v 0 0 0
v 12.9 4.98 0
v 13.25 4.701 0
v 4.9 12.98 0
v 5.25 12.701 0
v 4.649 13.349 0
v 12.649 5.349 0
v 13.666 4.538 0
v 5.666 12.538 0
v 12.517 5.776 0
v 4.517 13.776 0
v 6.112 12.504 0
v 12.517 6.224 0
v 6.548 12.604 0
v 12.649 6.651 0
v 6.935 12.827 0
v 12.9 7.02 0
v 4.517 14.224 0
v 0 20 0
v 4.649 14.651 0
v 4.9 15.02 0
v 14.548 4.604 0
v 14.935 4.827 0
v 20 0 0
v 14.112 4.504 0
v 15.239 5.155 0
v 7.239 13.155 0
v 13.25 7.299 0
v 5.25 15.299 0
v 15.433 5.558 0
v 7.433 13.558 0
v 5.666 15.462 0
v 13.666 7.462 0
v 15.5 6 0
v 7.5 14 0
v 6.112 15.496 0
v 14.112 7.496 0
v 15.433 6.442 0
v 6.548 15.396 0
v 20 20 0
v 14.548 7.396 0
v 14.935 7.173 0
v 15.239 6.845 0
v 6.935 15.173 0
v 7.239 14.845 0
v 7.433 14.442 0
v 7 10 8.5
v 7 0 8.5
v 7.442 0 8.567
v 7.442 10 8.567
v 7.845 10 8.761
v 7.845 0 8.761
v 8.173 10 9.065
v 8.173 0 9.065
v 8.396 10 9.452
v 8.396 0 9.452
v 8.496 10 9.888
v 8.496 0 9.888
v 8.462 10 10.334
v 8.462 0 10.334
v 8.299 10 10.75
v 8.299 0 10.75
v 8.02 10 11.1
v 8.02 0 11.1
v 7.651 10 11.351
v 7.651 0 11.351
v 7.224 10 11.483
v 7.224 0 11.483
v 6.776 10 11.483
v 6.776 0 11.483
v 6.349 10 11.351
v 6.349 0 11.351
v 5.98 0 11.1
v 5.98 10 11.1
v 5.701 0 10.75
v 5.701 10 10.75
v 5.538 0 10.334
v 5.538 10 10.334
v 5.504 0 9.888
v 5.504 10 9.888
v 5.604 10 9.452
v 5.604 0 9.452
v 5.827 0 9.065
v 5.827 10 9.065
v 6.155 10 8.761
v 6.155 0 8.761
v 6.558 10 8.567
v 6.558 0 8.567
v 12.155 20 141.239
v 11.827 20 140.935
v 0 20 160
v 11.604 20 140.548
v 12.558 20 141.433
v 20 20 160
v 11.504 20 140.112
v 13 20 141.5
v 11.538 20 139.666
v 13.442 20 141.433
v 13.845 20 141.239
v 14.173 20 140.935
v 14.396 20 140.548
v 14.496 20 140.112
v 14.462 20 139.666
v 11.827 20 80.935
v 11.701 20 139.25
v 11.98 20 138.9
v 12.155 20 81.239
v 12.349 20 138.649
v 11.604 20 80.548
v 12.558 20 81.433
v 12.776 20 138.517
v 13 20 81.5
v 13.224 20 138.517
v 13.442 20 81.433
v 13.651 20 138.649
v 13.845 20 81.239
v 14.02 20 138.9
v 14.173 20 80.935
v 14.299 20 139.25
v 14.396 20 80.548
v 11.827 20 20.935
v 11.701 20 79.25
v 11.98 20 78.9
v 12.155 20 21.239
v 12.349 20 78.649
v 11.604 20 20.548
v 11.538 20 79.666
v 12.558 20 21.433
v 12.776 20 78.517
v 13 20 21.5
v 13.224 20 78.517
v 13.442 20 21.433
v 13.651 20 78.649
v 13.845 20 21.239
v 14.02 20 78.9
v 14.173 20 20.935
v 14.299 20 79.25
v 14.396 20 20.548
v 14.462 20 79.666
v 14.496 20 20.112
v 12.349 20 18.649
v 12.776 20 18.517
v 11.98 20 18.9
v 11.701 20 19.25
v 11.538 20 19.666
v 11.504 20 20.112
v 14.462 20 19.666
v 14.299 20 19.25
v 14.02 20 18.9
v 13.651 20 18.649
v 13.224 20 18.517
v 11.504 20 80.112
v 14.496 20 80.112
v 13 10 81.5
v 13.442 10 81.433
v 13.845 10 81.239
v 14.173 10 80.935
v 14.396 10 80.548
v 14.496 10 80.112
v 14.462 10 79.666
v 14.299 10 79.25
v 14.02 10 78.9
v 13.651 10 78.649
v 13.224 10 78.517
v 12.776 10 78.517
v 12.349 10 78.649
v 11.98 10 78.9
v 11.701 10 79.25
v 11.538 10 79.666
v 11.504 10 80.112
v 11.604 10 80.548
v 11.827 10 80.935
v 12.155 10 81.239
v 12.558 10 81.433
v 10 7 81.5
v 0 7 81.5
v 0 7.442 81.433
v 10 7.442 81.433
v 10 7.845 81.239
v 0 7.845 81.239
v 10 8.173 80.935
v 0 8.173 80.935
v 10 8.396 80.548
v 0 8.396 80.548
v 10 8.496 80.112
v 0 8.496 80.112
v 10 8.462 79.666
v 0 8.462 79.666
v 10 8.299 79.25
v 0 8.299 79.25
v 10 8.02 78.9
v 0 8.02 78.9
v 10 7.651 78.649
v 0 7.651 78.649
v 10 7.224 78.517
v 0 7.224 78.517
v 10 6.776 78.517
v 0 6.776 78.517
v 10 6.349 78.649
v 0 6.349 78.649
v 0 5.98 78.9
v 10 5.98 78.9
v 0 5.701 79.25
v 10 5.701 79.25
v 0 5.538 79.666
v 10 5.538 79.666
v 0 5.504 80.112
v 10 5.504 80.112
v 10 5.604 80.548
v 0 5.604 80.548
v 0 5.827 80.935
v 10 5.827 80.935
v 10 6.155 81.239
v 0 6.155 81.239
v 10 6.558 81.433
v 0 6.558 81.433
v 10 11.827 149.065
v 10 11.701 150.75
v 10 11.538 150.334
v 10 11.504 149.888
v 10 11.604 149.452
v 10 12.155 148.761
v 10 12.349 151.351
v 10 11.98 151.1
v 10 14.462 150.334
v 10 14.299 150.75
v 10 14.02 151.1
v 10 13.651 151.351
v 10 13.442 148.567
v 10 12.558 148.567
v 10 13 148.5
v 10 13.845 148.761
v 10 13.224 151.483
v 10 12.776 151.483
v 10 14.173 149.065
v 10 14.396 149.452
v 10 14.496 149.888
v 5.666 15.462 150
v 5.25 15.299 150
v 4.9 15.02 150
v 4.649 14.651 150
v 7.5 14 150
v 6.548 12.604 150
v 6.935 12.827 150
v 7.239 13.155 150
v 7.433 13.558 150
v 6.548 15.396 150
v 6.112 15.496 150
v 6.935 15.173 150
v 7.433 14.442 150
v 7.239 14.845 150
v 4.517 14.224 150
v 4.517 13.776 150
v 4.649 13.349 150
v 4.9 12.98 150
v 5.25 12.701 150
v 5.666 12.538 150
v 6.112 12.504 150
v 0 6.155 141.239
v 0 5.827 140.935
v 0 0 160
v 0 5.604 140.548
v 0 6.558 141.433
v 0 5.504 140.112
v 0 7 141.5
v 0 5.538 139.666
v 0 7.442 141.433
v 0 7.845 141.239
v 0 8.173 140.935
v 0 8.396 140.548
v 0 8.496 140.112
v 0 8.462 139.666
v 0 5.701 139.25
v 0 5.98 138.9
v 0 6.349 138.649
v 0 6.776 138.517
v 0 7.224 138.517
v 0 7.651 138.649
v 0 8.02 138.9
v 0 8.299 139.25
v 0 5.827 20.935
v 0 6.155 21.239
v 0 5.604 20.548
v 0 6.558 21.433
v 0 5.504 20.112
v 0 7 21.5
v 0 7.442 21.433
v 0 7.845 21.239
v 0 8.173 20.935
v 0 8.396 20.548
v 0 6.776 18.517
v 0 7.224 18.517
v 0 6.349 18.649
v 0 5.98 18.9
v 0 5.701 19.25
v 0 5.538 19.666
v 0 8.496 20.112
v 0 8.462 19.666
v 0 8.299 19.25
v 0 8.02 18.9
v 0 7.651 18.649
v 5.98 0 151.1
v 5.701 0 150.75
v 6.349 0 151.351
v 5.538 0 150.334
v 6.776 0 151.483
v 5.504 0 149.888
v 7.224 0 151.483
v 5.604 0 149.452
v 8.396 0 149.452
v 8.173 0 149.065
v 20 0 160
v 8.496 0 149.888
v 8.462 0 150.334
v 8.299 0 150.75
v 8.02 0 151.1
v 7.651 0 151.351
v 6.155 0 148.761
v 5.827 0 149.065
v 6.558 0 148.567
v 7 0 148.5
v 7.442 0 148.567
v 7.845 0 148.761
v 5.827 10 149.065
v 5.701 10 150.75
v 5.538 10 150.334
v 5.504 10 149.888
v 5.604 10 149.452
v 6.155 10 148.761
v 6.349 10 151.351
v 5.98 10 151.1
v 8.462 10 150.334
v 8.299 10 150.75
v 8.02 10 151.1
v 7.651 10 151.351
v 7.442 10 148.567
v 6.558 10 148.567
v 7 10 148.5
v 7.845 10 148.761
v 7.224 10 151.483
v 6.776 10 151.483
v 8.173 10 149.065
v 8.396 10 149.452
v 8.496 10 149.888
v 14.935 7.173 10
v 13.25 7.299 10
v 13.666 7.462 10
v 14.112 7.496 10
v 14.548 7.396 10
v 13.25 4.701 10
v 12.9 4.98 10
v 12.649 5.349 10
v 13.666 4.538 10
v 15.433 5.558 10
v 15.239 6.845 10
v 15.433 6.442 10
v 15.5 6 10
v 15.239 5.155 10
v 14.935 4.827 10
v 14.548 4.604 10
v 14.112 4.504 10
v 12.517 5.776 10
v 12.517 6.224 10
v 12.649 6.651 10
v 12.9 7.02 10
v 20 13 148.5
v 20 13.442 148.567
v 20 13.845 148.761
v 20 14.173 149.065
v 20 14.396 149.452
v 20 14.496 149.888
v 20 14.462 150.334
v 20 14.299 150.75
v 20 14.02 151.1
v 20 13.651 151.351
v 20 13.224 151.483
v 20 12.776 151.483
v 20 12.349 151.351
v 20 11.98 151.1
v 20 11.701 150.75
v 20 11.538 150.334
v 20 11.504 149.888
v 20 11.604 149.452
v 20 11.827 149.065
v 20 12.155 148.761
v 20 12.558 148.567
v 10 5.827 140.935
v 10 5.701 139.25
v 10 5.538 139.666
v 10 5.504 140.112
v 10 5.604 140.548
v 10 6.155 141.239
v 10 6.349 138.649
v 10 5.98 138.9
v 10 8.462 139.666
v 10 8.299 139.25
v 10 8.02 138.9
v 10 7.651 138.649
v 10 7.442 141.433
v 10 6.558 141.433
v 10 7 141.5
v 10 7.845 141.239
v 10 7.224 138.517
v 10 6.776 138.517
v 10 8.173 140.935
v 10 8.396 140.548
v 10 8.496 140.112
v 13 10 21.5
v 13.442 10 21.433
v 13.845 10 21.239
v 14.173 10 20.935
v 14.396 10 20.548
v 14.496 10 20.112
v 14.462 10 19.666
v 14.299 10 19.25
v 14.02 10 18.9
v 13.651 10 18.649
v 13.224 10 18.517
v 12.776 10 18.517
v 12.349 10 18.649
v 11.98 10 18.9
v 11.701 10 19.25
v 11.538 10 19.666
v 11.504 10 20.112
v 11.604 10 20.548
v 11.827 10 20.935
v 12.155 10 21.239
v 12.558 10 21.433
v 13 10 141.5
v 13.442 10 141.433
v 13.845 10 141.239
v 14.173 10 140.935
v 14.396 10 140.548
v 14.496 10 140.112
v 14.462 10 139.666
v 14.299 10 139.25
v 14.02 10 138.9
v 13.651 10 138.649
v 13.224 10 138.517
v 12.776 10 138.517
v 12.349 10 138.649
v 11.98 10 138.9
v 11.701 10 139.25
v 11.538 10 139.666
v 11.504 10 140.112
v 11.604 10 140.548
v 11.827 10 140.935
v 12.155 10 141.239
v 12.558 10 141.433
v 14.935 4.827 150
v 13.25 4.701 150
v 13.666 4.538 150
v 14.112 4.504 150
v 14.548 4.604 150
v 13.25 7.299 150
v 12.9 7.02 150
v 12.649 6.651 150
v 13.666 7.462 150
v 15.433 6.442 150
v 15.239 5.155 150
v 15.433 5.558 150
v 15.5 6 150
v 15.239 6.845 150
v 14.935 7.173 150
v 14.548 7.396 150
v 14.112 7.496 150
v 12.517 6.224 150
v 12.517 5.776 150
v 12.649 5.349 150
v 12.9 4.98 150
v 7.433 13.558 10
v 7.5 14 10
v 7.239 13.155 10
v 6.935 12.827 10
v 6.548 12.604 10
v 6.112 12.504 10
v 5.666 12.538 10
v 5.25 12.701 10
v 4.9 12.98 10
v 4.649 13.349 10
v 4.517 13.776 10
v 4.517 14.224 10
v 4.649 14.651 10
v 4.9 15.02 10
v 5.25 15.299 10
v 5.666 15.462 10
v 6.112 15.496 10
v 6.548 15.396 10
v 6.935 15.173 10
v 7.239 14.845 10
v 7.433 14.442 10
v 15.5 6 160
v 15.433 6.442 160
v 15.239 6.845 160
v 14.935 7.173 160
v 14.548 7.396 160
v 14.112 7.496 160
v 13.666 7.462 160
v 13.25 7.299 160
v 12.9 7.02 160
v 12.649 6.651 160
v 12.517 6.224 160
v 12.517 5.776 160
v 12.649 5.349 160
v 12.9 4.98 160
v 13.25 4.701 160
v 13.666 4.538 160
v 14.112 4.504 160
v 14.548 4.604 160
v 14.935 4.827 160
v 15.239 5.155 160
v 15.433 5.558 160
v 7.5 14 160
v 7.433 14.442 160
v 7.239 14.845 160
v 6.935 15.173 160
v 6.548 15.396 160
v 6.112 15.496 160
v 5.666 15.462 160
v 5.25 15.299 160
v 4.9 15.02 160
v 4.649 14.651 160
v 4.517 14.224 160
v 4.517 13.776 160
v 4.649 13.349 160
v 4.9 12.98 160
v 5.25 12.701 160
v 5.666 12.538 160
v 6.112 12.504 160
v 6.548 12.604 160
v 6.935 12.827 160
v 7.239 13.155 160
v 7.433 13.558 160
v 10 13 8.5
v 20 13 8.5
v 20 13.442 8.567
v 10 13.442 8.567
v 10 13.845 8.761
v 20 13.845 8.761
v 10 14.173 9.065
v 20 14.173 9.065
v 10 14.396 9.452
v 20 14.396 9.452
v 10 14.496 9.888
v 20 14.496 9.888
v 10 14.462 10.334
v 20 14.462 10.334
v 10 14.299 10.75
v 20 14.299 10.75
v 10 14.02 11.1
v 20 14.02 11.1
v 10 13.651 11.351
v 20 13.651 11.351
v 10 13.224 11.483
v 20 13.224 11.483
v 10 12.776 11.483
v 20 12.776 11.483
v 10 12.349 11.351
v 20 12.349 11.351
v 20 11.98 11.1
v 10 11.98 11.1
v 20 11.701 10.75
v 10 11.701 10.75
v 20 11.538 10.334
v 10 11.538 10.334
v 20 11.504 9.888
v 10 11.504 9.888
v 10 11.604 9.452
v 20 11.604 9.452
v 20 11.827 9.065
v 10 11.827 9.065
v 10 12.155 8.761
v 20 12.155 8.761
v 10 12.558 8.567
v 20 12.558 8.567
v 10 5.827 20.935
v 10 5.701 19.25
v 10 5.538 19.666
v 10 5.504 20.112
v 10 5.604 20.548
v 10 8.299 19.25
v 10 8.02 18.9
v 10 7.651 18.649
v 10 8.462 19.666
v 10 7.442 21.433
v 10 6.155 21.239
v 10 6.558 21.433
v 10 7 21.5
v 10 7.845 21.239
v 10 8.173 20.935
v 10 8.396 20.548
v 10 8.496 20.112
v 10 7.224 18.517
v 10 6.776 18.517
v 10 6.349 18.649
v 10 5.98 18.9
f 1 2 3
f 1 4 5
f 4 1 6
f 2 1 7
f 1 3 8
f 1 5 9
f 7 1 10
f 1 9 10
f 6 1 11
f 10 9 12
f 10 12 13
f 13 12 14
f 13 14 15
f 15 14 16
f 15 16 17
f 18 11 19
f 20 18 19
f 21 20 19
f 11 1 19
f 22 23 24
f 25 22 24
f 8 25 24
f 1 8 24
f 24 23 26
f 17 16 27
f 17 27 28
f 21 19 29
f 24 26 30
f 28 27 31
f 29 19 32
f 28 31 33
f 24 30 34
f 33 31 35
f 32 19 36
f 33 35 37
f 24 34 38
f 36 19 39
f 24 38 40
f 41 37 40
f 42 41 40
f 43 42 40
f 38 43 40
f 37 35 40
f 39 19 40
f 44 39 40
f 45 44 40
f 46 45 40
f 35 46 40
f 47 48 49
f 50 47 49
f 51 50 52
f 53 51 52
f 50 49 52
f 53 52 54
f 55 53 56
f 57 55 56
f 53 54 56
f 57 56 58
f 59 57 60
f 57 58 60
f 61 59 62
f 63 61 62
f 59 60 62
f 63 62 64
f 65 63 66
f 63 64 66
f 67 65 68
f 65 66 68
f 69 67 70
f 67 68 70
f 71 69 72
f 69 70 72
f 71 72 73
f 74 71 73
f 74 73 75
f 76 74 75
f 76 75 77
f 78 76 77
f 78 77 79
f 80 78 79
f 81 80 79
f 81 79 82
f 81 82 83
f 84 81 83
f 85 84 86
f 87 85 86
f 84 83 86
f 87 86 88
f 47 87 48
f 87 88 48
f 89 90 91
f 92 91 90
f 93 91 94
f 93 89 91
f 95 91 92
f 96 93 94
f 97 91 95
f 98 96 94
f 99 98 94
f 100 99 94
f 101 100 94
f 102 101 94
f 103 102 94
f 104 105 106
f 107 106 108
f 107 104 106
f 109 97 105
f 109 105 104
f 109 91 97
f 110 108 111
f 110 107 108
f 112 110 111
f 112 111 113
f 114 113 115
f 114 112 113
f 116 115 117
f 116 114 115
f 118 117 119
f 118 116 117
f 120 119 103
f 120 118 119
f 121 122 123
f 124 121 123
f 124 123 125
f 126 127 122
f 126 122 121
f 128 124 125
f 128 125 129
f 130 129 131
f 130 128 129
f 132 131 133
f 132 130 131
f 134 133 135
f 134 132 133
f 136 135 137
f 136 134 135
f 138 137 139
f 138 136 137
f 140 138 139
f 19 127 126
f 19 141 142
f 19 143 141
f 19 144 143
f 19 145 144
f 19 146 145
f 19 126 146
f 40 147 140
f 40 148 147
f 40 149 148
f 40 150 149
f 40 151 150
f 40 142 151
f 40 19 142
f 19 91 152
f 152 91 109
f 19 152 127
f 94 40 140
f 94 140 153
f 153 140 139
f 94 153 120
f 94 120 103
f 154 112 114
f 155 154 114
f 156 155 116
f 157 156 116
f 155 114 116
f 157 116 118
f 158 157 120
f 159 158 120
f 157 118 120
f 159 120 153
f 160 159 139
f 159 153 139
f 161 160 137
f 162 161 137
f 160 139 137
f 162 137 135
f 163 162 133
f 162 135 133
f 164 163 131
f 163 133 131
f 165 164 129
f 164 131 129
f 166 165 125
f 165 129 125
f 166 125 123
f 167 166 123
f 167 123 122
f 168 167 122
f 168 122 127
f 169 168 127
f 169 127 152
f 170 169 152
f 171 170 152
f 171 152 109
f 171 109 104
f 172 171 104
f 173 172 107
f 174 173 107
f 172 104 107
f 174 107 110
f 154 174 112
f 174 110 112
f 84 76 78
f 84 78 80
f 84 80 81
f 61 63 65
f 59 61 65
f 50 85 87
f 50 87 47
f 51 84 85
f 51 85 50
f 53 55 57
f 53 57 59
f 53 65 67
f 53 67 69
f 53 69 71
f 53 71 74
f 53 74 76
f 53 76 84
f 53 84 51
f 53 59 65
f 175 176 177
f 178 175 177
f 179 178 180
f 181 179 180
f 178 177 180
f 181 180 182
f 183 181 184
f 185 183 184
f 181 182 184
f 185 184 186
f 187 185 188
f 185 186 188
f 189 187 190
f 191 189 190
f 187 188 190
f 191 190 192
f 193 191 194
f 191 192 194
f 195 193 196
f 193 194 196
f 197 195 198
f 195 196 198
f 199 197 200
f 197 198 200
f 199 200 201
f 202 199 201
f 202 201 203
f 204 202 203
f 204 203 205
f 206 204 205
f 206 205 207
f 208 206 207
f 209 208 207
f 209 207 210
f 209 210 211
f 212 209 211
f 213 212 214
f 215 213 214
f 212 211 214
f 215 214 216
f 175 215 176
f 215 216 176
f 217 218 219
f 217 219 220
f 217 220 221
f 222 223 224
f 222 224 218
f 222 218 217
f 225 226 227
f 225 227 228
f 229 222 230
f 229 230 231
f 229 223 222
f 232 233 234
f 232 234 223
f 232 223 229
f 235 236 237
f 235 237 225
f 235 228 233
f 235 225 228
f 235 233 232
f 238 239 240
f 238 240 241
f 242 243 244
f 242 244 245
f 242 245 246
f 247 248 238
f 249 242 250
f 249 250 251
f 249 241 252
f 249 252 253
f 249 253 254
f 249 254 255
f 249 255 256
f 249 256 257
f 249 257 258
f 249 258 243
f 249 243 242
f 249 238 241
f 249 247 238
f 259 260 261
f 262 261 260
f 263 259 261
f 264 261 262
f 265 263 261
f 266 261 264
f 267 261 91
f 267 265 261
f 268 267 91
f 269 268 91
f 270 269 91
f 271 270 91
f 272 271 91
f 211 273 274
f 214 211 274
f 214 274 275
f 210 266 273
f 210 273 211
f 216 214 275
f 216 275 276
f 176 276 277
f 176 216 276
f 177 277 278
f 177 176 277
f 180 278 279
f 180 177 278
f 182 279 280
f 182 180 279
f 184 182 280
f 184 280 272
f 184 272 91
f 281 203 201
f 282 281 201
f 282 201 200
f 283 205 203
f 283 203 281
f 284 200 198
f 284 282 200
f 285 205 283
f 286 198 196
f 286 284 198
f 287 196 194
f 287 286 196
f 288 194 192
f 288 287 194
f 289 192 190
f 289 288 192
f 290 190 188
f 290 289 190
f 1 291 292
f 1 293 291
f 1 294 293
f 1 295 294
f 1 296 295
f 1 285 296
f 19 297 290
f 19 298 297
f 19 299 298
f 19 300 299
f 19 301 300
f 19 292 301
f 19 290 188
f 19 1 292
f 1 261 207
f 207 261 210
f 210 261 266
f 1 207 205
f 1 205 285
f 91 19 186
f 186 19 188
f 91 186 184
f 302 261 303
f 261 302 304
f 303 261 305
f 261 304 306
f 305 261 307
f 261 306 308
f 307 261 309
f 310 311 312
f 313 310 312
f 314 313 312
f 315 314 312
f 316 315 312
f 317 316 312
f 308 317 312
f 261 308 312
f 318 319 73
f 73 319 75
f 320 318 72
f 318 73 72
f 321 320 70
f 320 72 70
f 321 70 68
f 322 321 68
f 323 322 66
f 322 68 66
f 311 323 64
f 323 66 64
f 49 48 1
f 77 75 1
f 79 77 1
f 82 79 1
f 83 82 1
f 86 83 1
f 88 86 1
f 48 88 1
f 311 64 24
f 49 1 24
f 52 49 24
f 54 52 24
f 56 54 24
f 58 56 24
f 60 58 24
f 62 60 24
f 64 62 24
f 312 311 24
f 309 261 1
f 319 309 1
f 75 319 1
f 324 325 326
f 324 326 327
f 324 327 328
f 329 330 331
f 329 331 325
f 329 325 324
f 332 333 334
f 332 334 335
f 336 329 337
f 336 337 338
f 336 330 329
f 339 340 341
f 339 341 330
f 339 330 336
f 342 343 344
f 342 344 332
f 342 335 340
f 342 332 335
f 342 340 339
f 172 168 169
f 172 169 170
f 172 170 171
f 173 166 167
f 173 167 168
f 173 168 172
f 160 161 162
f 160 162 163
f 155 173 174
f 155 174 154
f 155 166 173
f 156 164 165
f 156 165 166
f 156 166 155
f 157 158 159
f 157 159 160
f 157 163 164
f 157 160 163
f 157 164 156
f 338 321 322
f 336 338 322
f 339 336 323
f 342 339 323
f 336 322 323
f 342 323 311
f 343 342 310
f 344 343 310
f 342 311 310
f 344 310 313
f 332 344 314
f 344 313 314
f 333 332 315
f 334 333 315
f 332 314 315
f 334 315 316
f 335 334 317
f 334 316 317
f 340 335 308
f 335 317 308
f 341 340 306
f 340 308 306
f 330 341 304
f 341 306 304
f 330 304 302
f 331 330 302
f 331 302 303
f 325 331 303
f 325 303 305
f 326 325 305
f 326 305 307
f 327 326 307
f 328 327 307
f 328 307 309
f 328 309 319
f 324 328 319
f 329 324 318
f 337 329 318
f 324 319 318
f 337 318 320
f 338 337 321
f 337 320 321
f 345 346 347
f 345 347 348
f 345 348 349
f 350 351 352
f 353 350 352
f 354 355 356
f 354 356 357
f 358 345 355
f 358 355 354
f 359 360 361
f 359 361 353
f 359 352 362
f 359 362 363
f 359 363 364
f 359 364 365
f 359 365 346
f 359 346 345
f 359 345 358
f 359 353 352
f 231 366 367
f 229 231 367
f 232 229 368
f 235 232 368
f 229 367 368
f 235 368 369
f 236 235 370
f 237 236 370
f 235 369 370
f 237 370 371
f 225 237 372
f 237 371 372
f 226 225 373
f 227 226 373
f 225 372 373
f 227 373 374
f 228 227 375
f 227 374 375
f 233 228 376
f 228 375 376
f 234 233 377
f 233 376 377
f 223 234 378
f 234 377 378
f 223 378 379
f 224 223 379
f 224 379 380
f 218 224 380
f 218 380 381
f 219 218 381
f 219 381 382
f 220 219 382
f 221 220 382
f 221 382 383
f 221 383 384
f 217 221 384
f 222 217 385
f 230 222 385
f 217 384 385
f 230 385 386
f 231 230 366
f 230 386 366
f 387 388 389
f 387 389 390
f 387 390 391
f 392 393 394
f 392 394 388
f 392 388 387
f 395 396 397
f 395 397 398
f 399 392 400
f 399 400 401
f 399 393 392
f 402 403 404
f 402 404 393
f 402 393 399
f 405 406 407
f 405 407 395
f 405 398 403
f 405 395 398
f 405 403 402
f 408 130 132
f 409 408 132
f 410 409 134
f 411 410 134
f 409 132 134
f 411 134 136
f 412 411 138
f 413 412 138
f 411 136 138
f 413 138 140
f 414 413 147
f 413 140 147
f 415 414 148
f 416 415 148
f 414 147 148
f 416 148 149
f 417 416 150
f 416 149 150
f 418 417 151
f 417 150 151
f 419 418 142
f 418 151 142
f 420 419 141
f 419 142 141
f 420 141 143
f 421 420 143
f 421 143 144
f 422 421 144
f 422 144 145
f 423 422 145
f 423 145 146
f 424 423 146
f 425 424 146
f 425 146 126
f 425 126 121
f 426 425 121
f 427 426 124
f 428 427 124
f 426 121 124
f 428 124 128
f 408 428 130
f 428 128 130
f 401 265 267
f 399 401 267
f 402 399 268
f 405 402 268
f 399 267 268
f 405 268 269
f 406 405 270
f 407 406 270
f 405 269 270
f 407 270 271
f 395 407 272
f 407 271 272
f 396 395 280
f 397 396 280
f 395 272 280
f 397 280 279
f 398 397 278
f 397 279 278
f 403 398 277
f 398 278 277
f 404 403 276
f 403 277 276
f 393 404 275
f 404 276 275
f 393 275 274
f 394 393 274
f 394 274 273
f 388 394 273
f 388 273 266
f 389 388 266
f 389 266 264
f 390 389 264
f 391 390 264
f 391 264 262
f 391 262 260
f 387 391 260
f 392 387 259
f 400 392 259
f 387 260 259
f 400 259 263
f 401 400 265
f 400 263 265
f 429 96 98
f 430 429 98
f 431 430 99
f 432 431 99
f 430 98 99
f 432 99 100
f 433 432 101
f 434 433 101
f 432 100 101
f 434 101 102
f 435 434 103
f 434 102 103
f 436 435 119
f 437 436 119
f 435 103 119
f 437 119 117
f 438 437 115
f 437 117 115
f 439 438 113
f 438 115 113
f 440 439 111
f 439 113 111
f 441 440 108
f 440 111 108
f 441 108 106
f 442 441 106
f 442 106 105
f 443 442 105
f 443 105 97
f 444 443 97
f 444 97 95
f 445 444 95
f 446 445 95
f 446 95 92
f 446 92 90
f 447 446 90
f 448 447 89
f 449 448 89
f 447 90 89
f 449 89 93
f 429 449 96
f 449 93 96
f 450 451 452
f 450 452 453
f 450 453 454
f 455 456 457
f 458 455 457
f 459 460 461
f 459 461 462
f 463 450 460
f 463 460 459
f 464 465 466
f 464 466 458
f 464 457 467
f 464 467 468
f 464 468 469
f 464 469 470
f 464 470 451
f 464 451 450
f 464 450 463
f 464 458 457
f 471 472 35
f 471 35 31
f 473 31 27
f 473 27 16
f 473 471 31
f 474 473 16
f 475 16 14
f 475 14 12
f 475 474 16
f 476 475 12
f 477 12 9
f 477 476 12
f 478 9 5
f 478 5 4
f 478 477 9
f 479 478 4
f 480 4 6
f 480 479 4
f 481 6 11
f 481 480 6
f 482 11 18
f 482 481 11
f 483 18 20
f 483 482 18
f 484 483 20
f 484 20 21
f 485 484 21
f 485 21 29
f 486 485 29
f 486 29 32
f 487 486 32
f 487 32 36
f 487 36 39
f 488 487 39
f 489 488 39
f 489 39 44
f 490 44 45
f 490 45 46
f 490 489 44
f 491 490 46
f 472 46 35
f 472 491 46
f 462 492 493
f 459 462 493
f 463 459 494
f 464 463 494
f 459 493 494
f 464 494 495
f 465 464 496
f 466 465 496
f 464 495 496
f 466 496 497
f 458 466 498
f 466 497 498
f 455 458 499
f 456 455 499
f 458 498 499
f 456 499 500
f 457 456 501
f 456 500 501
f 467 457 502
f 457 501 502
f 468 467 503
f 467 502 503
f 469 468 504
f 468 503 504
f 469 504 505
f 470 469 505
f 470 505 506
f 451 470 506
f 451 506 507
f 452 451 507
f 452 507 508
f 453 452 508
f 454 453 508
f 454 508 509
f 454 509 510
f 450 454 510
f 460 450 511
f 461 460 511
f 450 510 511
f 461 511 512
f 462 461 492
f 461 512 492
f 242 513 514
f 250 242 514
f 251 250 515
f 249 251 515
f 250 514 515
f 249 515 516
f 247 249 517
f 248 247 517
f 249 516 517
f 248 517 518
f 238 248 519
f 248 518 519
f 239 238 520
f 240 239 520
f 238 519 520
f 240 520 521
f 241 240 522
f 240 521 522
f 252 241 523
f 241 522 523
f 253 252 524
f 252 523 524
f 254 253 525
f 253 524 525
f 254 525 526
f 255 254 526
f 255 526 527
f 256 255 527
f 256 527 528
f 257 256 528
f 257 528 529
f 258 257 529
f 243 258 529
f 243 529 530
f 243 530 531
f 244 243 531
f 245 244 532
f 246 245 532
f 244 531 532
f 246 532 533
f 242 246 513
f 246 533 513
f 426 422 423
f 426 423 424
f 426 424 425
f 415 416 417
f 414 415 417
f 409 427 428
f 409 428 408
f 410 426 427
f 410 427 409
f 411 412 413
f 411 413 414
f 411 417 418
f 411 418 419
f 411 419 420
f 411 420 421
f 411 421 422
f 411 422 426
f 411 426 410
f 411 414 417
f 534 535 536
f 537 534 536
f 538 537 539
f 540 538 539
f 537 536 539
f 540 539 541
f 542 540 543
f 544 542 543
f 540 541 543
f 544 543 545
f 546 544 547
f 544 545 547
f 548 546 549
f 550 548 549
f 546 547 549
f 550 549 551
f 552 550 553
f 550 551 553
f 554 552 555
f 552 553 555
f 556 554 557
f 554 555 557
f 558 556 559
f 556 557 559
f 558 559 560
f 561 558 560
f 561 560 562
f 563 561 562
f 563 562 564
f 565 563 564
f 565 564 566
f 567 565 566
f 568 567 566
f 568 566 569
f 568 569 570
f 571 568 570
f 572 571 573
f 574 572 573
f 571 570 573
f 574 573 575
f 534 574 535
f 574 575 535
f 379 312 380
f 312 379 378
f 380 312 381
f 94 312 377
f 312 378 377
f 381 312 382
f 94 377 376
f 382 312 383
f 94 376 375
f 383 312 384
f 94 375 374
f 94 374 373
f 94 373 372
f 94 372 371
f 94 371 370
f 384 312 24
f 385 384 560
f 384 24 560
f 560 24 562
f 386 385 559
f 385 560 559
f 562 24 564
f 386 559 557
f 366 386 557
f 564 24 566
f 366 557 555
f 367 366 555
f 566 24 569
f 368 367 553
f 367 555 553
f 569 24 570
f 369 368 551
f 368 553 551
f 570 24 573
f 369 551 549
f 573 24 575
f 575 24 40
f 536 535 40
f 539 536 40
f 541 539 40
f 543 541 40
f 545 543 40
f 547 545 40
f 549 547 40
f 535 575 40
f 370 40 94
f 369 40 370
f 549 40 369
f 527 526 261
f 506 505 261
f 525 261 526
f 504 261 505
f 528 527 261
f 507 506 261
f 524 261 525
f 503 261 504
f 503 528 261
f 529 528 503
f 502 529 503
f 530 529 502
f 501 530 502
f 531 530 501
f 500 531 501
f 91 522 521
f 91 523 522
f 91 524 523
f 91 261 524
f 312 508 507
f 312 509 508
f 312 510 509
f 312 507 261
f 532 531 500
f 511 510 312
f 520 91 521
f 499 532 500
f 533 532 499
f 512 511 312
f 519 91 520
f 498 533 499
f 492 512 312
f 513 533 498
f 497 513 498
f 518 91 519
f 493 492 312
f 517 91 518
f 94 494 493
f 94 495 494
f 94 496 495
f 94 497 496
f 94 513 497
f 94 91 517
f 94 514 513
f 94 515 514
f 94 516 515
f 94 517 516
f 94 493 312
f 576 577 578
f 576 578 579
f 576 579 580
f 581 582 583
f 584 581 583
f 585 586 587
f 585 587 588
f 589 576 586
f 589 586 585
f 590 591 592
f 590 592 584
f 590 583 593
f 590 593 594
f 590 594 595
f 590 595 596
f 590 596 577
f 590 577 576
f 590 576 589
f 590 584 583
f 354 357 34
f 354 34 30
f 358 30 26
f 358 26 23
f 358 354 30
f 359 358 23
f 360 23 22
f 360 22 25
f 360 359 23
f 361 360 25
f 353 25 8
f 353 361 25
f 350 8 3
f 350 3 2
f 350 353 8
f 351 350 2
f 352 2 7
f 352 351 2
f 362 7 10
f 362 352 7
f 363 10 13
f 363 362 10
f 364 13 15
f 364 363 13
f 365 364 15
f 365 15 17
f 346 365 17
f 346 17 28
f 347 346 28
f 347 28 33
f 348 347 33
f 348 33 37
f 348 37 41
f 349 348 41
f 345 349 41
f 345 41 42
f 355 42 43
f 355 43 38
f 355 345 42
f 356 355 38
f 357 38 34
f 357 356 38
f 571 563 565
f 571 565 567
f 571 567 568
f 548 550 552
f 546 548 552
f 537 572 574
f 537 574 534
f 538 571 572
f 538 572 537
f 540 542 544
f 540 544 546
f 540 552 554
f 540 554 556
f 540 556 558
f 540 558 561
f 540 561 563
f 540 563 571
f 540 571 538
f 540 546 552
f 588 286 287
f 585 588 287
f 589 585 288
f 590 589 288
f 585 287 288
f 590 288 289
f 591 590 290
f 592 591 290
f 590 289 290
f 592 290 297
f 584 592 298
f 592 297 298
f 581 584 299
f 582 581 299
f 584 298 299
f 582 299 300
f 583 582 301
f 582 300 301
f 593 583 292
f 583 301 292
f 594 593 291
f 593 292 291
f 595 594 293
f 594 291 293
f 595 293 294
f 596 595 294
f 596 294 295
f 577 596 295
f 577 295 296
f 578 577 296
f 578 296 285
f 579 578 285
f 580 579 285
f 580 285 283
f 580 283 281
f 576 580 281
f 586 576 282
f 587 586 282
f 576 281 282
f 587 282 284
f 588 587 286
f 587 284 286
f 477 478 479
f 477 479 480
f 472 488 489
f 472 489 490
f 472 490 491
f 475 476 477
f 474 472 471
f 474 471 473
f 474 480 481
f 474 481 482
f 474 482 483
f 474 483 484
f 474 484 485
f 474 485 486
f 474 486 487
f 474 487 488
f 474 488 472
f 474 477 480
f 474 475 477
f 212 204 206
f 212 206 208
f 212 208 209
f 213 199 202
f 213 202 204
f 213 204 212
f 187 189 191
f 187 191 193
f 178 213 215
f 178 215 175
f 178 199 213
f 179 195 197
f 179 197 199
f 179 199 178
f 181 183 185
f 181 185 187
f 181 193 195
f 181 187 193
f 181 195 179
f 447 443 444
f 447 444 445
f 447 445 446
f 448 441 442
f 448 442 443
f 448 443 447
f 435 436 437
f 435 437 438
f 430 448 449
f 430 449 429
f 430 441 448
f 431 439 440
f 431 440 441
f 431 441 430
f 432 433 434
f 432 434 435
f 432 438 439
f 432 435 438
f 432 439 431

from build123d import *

# Parameters (mm, degrees)
IZIM1_W                     = 20
IZIM1_H                     = 20
Y_KSEKLIK_EKSTR_ZYON1_DEPTH = 160
IZIM13_R                    = 1.5
KES_EKSTR_ZYON1_DEPTH       = 10
KES_EKSTR_ZYON2_START       = -10
IZIM15_R                    = 1.5
KES_EKSTR_ZYON2_DEPTH       = 10
IZIM18_R                    = 1.5
KES_EKSTR_ZYON3_DEPTH       = 10
IZIM20_R                    = 1.5
KES_EKSTR_ZYON4_DEPTH       = 10
SKETCH1_R                   = 1.5
CUT_EXTRUDE1_DEPTH          = 10
SKETCH2_R                   = 1.5
CUT_EXTRUDE2_DEPTH          = 10


with BuildPart() as part:
    # Çizim1 → Yükseklik-Ekstrüzyon1 (new body)
    with BuildSketch(Plane.XY):
        with Locations((10, 10)):
            Rectangle(IZIM1_W, IZIM1_H)
    extrude(amount=Y_KSEKLIK_EKSTR_ZYON1_DEPTH)

    # Çizim13 → Kes-Ekstrüzyon1 (cut)
    with BuildSketch(Plane.XY.offset(160)):
        with Locations((14, 6)):
            Circle(IZIM13_R)
        with Locations((6, 14)):
            Circle(IZIM13_R)
    extrude(amount=-KES_EKSTR_ZYON1_DEPTH, mode=Mode.SUBTRACT)

    # Çizim15 → Kes-Ekstrüzyon2 (cut)
    with BuildSketch(Plane(origin=(0, 0, 0), x_dir=(-1, 0, 0), z_dir=(0, 0, -1)).offset(KES_EKSTR_ZYON2_START)):
        with Locations(Location((-14, 6, 0), (0, 0, 180))):
            Circle(IZIM15_R)
        with Locations(Location((-6, 14, 0), (0, 0, 180))):
            Circle(IZIM15_R)
    extrude(amount=KES_EKSTR_ZYON2_DEPTH, mode=Mode.SUBTRACT)

    # Çizim18 → Kes-Ekstrüzyon3 (cut)
    with BuildSketch(Plane(origin=(20, 0, 0), x_dir=(0, 0, -1), z_dir=(1, 0, 0))):
        with Locations((-10, 13)):
            Circle(IZIM18_R)
        with Locations((-150, 13)):
            Circle(IZIM18_R)
    extrude(amount=-KES_EKSTR_ZYON3_DEPTH, mode=Mode.SUBTRACT)

    # Çizim20 → Kes-Ekstrüzyon4 (cut)
    with BuildSketch(Plane.XZ):
        with Locations(Location((7, 10, 0), (0, 0, 270))):
            Circle(IZIM20_R)
        with Locations(Location((7, 150, 0), (0, 0, 270))):
            Circle(IZIM20_R)
    extrude(amount=-KES_EKSTR_ZYON4_DEPTH, mode=Mode.SUBTRACT)

    # Sketch1 → Cut-Extrude1 (cut)
    with BuildSketch(Plane(origin=(0, 20, 0), x_dir=(1, 0, 0), z_dir=(0, 1, 0))):
        with Locations(Location((13, -20, 0), (0, 0, 270))):
            Circle(SKETCH1_R)
        with Locations(Location((13, -80, 0), (0, 0, 270))):
            Circle(SKETCH1_R)
        with Locations(Location((13, -140, 0), (0, 0, 270))):
            Circle(SKETCH1_R)
    extrude(amount=-CUT_EXTRUDE1_DEPTH, mode=Mode.SUBTRACT)

    # Sketch2 → Cut-Extrude2 (cut)
    with BuildSketch(Plane.ZY):
        with Locations((20, 7)):
            Circle(SKETCH2_R)
        with Locations((80, 7)):
            Circle(SKETCH2_R)
        with Locations((140, 7)):
            Circle(SKETCH2_R)
    extrude(amount=-CUT_EXTRUDE2_DEPTH, mode=Mode.SUBTRACT)


solid = part.part
